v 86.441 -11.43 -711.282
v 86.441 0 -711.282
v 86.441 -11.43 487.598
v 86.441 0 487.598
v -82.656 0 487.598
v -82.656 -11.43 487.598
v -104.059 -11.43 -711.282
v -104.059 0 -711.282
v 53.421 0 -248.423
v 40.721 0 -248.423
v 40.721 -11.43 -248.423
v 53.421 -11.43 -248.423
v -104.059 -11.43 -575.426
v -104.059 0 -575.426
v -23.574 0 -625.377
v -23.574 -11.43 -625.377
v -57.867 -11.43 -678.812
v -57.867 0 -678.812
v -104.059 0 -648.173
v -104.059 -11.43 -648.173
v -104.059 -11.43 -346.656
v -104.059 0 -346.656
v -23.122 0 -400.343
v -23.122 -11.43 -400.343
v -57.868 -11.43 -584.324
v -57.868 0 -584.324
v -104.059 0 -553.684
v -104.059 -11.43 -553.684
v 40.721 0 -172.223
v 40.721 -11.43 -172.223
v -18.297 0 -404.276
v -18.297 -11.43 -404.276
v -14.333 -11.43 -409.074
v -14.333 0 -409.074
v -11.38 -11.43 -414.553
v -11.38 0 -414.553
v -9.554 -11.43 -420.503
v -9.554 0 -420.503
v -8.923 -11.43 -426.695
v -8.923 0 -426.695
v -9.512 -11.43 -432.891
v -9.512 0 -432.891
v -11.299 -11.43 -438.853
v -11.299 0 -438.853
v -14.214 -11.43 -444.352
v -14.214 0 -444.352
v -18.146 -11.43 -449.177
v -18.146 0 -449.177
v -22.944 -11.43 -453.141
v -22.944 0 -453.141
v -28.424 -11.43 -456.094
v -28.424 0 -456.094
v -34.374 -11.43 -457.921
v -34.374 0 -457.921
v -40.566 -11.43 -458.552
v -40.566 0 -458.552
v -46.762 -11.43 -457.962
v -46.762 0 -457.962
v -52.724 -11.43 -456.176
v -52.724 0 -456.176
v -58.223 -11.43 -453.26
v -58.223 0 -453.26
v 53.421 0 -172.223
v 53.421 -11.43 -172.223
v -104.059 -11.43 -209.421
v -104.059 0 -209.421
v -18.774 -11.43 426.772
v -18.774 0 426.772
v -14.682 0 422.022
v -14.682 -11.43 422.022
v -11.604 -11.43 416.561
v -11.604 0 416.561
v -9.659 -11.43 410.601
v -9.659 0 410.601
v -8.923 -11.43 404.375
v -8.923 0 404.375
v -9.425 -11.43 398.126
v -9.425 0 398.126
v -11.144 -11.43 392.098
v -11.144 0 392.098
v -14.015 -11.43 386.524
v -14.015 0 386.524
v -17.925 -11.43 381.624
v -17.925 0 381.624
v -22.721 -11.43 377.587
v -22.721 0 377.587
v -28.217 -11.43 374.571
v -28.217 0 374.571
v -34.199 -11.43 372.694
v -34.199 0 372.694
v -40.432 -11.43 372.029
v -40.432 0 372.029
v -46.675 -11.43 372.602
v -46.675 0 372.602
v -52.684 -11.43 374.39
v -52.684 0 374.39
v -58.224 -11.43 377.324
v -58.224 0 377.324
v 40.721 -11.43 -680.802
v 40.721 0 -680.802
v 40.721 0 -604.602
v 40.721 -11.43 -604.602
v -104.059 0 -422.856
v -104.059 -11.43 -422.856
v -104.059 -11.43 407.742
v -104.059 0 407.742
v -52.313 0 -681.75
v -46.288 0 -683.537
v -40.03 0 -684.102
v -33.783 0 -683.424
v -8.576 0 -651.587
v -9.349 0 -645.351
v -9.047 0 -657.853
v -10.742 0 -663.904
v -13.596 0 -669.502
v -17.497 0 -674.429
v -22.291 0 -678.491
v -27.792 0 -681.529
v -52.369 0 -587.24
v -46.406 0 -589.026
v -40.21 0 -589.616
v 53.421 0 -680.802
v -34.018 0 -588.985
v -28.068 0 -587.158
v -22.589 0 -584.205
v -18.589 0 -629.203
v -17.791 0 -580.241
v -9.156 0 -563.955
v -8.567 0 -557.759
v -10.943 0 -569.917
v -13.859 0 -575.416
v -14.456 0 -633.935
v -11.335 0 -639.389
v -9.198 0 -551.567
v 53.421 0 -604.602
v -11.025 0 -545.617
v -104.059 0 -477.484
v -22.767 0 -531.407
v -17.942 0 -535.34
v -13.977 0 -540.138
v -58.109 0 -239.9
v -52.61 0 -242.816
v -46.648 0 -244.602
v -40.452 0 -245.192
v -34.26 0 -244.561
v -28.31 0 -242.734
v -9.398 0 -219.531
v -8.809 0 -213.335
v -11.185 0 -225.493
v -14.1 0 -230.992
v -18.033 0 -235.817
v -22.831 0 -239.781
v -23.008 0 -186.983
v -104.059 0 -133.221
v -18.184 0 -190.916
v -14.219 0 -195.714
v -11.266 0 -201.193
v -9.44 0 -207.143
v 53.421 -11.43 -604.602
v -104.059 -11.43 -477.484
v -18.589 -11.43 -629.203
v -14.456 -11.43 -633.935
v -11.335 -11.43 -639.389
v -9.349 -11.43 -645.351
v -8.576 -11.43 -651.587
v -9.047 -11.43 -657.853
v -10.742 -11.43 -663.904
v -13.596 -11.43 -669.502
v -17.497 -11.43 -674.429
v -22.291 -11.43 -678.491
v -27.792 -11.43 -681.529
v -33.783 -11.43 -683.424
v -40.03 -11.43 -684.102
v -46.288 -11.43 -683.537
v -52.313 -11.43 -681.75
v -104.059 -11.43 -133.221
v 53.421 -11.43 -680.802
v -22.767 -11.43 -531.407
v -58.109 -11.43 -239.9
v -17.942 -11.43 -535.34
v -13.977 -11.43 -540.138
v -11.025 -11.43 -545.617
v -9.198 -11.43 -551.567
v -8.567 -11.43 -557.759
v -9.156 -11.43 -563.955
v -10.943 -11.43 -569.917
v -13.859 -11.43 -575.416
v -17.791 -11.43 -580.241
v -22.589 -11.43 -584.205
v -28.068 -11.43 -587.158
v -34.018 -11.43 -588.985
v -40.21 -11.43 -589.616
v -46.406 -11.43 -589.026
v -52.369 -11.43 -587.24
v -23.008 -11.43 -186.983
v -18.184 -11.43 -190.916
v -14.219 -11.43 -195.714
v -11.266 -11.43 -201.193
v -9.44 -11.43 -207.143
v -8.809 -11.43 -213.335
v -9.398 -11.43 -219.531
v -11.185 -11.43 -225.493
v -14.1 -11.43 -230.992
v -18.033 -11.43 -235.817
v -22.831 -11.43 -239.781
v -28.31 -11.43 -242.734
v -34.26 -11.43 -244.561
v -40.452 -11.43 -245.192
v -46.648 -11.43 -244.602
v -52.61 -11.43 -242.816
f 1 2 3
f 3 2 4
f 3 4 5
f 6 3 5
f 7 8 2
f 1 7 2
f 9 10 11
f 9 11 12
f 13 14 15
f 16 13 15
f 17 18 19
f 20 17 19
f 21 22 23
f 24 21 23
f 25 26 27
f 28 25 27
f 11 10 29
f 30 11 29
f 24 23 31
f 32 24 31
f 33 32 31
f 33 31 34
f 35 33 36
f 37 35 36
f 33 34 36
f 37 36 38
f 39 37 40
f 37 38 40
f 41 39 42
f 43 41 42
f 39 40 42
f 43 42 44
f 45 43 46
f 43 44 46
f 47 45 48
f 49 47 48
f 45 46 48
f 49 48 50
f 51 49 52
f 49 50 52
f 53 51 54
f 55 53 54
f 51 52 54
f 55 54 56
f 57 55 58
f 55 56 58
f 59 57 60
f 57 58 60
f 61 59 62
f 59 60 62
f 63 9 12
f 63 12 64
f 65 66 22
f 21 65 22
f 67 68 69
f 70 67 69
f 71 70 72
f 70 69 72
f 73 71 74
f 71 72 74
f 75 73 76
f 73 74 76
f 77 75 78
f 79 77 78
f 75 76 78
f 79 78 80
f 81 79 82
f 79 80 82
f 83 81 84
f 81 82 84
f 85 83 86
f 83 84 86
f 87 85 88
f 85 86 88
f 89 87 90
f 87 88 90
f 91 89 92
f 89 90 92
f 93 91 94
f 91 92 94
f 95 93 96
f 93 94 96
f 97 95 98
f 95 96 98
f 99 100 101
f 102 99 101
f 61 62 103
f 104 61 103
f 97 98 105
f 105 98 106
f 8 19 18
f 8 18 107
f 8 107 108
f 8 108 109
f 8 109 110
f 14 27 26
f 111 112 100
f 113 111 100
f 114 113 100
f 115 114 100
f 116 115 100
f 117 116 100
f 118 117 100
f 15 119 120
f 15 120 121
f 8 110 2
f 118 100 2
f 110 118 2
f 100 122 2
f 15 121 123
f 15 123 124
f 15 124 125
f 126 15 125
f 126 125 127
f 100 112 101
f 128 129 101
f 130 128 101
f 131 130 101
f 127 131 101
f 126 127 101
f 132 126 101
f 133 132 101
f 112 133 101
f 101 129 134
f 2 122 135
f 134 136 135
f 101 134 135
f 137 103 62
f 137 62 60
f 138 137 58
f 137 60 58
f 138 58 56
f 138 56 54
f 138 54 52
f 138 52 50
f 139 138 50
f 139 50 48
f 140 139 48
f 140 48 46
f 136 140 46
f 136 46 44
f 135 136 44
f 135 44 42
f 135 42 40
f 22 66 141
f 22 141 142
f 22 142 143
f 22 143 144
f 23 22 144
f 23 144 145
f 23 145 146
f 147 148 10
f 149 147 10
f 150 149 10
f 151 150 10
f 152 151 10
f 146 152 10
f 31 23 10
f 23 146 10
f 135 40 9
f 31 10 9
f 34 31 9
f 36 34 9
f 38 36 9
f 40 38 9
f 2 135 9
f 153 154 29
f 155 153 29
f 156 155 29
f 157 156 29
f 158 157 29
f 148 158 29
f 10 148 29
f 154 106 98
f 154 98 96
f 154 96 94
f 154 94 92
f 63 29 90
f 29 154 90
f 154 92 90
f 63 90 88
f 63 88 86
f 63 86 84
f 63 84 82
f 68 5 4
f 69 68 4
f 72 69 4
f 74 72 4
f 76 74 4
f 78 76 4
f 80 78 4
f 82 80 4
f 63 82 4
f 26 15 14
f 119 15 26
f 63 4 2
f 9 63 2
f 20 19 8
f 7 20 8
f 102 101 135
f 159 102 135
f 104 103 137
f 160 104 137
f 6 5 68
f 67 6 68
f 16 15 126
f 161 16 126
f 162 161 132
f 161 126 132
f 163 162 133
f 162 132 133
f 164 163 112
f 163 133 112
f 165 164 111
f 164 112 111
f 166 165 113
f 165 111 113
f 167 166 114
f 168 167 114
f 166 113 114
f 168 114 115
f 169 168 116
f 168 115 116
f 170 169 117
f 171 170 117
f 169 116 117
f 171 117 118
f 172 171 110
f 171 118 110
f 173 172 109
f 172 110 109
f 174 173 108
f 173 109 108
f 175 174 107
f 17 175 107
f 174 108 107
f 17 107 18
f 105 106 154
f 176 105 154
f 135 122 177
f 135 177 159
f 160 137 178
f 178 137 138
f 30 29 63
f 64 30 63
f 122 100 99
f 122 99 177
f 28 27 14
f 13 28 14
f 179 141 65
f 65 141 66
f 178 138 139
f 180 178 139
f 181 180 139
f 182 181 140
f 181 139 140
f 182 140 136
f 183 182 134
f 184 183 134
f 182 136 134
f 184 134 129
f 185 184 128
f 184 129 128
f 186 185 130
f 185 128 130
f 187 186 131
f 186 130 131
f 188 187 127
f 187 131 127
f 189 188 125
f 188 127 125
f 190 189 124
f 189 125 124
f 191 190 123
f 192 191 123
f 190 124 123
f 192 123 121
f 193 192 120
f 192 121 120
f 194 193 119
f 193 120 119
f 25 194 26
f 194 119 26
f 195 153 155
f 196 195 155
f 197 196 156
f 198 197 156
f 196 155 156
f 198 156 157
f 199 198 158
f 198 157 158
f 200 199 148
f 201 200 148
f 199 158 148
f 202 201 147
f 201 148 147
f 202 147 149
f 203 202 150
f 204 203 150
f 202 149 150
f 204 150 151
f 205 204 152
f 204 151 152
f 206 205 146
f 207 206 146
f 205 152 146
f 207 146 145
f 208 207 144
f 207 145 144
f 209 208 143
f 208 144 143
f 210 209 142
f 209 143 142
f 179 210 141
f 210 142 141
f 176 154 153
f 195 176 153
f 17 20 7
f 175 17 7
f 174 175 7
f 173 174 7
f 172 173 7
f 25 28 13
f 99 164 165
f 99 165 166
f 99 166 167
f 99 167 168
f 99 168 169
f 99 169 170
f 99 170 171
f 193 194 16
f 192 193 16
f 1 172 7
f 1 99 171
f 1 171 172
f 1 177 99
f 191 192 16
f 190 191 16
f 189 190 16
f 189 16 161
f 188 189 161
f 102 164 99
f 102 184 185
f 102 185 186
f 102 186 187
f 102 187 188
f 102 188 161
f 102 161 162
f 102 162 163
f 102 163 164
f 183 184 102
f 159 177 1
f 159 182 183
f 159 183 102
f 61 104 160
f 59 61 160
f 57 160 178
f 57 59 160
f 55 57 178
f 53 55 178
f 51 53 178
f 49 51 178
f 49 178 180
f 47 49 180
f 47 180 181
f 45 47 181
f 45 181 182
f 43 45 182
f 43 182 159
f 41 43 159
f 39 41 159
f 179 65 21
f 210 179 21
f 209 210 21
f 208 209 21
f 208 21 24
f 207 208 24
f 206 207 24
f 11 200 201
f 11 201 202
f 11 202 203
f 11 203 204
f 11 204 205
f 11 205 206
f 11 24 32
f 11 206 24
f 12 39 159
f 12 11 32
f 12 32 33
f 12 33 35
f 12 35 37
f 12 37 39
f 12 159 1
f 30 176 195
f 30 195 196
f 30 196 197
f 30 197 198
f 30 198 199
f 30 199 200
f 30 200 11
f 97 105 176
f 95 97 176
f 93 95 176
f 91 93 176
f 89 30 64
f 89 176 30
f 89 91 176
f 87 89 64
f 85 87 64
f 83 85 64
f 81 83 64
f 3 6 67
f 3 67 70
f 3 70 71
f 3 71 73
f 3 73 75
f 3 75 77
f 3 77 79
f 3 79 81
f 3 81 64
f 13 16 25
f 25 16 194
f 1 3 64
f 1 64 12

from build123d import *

# Parameters (mm, degrees)
F0_W     = 12.7
F0_H     = 76.2
F1_DEPTH = 11.43


# Not quite as in the source:
# - a feature names something its author has since deleted; it is built from what else it names


with BuildPart() as f1:
    # F0 (on Front) → F1 (new body)
    with BuildSketch(Plane.XZ):
        with BuildLine():
            Line((86.44143009, 487.5982903777), (-82.6555196025, 487.5982903777))
            Line((-82.6555196025, 487.5982903777), (-18.7736136836, 426.7721436688))
            ThreePointArc((-18.7736136836, 426.7721436688), (-15.8484759418, 383.977401572), (-58.2239000145, 377.323844885))
            Line((-58.2239000145, 377.323844885), (-104.05856991, 407.7417460511))
            Line((-104.05856991, 407.7417460511), (-104.05856991, -133.2205747848))
            Line((-104.05856991, -133.2205747848), (-23.008097061, -186.9833762889))
            ThreePointArc((-23.008097061, -186.9833762889), (-14.1002365767, -230.9921824712), (-58.109042759, -239.9000429556))
            Line((-58.109042759, -239.9000429556), (-104.05856991, -209.4205747848))
            Line((-104.05856991, -209.4205747848), (-104.05856991, -346.656112826))
            Line((-104.05856991, -346.656112826), (-23.121974943, -400.3433762889))
            ThreePointArc((-23.121974943, -400.3433762889), (-14.2141144586, -444.3521824712), (-58.2229206409, -453.2600429556))
            Line((-58.2229206409, -453.2600429556), (-104.05856991, -422.856112826))
            Line((-104.05856991, -422.856112826), (-104.05856991, -477.484384418))
            Line((-104.05856991, -477.484384418), (-22.7666009966, -531.4073762889))
            ThreePointArc((-22.7666009966, -531.4073762889), (-13.8587405122, -575.4161824712), (-57.8675466945, -584.3240429556))
            Line((-57.8675466945, -584.3240429556), (-104.05856991, -553.684384418))
            Line((-104.05856991, -553.684384418), (-104.05856991, -575.4260893394))
            Line((-104.05856991, -575.4260893394), (-23.5744710882, -625.3769093504))
            ThreePointArc((-23.5744710882, -625.3769093504), (-13.5964073743, -669.50213472), (-57.8674036509, -678.8121378395))
            Line((-57.8674036509, -678.8121378395), (-104.05856991, -648.172744022))
            Line((-104.05856991, -648.172744022), (-104.05856991, -711.2817096223))
            Line((-104.05856991, -711.2817096223), (47.07143009, -711.2817096223))
            Line((47.07143009, -711.2817096223), (86.44143009, -711.2817096223))
            Line((86.44143009, -711.2817096223), (86.44143009, 487.5982903777))
        make_face()
        with Locations((47.07143009, -642.7017096223)):
            Rectangle(F0_W, F0_H, mode=Mode.SUBTRACT)
        with Locations((47.07143009, -210.3231889248)):
            Rectangle(F0_W, F0_H, mode=Mode.SUBTRACT)
    extrude(amount=F1_DEPTH)


solid = f1.part
